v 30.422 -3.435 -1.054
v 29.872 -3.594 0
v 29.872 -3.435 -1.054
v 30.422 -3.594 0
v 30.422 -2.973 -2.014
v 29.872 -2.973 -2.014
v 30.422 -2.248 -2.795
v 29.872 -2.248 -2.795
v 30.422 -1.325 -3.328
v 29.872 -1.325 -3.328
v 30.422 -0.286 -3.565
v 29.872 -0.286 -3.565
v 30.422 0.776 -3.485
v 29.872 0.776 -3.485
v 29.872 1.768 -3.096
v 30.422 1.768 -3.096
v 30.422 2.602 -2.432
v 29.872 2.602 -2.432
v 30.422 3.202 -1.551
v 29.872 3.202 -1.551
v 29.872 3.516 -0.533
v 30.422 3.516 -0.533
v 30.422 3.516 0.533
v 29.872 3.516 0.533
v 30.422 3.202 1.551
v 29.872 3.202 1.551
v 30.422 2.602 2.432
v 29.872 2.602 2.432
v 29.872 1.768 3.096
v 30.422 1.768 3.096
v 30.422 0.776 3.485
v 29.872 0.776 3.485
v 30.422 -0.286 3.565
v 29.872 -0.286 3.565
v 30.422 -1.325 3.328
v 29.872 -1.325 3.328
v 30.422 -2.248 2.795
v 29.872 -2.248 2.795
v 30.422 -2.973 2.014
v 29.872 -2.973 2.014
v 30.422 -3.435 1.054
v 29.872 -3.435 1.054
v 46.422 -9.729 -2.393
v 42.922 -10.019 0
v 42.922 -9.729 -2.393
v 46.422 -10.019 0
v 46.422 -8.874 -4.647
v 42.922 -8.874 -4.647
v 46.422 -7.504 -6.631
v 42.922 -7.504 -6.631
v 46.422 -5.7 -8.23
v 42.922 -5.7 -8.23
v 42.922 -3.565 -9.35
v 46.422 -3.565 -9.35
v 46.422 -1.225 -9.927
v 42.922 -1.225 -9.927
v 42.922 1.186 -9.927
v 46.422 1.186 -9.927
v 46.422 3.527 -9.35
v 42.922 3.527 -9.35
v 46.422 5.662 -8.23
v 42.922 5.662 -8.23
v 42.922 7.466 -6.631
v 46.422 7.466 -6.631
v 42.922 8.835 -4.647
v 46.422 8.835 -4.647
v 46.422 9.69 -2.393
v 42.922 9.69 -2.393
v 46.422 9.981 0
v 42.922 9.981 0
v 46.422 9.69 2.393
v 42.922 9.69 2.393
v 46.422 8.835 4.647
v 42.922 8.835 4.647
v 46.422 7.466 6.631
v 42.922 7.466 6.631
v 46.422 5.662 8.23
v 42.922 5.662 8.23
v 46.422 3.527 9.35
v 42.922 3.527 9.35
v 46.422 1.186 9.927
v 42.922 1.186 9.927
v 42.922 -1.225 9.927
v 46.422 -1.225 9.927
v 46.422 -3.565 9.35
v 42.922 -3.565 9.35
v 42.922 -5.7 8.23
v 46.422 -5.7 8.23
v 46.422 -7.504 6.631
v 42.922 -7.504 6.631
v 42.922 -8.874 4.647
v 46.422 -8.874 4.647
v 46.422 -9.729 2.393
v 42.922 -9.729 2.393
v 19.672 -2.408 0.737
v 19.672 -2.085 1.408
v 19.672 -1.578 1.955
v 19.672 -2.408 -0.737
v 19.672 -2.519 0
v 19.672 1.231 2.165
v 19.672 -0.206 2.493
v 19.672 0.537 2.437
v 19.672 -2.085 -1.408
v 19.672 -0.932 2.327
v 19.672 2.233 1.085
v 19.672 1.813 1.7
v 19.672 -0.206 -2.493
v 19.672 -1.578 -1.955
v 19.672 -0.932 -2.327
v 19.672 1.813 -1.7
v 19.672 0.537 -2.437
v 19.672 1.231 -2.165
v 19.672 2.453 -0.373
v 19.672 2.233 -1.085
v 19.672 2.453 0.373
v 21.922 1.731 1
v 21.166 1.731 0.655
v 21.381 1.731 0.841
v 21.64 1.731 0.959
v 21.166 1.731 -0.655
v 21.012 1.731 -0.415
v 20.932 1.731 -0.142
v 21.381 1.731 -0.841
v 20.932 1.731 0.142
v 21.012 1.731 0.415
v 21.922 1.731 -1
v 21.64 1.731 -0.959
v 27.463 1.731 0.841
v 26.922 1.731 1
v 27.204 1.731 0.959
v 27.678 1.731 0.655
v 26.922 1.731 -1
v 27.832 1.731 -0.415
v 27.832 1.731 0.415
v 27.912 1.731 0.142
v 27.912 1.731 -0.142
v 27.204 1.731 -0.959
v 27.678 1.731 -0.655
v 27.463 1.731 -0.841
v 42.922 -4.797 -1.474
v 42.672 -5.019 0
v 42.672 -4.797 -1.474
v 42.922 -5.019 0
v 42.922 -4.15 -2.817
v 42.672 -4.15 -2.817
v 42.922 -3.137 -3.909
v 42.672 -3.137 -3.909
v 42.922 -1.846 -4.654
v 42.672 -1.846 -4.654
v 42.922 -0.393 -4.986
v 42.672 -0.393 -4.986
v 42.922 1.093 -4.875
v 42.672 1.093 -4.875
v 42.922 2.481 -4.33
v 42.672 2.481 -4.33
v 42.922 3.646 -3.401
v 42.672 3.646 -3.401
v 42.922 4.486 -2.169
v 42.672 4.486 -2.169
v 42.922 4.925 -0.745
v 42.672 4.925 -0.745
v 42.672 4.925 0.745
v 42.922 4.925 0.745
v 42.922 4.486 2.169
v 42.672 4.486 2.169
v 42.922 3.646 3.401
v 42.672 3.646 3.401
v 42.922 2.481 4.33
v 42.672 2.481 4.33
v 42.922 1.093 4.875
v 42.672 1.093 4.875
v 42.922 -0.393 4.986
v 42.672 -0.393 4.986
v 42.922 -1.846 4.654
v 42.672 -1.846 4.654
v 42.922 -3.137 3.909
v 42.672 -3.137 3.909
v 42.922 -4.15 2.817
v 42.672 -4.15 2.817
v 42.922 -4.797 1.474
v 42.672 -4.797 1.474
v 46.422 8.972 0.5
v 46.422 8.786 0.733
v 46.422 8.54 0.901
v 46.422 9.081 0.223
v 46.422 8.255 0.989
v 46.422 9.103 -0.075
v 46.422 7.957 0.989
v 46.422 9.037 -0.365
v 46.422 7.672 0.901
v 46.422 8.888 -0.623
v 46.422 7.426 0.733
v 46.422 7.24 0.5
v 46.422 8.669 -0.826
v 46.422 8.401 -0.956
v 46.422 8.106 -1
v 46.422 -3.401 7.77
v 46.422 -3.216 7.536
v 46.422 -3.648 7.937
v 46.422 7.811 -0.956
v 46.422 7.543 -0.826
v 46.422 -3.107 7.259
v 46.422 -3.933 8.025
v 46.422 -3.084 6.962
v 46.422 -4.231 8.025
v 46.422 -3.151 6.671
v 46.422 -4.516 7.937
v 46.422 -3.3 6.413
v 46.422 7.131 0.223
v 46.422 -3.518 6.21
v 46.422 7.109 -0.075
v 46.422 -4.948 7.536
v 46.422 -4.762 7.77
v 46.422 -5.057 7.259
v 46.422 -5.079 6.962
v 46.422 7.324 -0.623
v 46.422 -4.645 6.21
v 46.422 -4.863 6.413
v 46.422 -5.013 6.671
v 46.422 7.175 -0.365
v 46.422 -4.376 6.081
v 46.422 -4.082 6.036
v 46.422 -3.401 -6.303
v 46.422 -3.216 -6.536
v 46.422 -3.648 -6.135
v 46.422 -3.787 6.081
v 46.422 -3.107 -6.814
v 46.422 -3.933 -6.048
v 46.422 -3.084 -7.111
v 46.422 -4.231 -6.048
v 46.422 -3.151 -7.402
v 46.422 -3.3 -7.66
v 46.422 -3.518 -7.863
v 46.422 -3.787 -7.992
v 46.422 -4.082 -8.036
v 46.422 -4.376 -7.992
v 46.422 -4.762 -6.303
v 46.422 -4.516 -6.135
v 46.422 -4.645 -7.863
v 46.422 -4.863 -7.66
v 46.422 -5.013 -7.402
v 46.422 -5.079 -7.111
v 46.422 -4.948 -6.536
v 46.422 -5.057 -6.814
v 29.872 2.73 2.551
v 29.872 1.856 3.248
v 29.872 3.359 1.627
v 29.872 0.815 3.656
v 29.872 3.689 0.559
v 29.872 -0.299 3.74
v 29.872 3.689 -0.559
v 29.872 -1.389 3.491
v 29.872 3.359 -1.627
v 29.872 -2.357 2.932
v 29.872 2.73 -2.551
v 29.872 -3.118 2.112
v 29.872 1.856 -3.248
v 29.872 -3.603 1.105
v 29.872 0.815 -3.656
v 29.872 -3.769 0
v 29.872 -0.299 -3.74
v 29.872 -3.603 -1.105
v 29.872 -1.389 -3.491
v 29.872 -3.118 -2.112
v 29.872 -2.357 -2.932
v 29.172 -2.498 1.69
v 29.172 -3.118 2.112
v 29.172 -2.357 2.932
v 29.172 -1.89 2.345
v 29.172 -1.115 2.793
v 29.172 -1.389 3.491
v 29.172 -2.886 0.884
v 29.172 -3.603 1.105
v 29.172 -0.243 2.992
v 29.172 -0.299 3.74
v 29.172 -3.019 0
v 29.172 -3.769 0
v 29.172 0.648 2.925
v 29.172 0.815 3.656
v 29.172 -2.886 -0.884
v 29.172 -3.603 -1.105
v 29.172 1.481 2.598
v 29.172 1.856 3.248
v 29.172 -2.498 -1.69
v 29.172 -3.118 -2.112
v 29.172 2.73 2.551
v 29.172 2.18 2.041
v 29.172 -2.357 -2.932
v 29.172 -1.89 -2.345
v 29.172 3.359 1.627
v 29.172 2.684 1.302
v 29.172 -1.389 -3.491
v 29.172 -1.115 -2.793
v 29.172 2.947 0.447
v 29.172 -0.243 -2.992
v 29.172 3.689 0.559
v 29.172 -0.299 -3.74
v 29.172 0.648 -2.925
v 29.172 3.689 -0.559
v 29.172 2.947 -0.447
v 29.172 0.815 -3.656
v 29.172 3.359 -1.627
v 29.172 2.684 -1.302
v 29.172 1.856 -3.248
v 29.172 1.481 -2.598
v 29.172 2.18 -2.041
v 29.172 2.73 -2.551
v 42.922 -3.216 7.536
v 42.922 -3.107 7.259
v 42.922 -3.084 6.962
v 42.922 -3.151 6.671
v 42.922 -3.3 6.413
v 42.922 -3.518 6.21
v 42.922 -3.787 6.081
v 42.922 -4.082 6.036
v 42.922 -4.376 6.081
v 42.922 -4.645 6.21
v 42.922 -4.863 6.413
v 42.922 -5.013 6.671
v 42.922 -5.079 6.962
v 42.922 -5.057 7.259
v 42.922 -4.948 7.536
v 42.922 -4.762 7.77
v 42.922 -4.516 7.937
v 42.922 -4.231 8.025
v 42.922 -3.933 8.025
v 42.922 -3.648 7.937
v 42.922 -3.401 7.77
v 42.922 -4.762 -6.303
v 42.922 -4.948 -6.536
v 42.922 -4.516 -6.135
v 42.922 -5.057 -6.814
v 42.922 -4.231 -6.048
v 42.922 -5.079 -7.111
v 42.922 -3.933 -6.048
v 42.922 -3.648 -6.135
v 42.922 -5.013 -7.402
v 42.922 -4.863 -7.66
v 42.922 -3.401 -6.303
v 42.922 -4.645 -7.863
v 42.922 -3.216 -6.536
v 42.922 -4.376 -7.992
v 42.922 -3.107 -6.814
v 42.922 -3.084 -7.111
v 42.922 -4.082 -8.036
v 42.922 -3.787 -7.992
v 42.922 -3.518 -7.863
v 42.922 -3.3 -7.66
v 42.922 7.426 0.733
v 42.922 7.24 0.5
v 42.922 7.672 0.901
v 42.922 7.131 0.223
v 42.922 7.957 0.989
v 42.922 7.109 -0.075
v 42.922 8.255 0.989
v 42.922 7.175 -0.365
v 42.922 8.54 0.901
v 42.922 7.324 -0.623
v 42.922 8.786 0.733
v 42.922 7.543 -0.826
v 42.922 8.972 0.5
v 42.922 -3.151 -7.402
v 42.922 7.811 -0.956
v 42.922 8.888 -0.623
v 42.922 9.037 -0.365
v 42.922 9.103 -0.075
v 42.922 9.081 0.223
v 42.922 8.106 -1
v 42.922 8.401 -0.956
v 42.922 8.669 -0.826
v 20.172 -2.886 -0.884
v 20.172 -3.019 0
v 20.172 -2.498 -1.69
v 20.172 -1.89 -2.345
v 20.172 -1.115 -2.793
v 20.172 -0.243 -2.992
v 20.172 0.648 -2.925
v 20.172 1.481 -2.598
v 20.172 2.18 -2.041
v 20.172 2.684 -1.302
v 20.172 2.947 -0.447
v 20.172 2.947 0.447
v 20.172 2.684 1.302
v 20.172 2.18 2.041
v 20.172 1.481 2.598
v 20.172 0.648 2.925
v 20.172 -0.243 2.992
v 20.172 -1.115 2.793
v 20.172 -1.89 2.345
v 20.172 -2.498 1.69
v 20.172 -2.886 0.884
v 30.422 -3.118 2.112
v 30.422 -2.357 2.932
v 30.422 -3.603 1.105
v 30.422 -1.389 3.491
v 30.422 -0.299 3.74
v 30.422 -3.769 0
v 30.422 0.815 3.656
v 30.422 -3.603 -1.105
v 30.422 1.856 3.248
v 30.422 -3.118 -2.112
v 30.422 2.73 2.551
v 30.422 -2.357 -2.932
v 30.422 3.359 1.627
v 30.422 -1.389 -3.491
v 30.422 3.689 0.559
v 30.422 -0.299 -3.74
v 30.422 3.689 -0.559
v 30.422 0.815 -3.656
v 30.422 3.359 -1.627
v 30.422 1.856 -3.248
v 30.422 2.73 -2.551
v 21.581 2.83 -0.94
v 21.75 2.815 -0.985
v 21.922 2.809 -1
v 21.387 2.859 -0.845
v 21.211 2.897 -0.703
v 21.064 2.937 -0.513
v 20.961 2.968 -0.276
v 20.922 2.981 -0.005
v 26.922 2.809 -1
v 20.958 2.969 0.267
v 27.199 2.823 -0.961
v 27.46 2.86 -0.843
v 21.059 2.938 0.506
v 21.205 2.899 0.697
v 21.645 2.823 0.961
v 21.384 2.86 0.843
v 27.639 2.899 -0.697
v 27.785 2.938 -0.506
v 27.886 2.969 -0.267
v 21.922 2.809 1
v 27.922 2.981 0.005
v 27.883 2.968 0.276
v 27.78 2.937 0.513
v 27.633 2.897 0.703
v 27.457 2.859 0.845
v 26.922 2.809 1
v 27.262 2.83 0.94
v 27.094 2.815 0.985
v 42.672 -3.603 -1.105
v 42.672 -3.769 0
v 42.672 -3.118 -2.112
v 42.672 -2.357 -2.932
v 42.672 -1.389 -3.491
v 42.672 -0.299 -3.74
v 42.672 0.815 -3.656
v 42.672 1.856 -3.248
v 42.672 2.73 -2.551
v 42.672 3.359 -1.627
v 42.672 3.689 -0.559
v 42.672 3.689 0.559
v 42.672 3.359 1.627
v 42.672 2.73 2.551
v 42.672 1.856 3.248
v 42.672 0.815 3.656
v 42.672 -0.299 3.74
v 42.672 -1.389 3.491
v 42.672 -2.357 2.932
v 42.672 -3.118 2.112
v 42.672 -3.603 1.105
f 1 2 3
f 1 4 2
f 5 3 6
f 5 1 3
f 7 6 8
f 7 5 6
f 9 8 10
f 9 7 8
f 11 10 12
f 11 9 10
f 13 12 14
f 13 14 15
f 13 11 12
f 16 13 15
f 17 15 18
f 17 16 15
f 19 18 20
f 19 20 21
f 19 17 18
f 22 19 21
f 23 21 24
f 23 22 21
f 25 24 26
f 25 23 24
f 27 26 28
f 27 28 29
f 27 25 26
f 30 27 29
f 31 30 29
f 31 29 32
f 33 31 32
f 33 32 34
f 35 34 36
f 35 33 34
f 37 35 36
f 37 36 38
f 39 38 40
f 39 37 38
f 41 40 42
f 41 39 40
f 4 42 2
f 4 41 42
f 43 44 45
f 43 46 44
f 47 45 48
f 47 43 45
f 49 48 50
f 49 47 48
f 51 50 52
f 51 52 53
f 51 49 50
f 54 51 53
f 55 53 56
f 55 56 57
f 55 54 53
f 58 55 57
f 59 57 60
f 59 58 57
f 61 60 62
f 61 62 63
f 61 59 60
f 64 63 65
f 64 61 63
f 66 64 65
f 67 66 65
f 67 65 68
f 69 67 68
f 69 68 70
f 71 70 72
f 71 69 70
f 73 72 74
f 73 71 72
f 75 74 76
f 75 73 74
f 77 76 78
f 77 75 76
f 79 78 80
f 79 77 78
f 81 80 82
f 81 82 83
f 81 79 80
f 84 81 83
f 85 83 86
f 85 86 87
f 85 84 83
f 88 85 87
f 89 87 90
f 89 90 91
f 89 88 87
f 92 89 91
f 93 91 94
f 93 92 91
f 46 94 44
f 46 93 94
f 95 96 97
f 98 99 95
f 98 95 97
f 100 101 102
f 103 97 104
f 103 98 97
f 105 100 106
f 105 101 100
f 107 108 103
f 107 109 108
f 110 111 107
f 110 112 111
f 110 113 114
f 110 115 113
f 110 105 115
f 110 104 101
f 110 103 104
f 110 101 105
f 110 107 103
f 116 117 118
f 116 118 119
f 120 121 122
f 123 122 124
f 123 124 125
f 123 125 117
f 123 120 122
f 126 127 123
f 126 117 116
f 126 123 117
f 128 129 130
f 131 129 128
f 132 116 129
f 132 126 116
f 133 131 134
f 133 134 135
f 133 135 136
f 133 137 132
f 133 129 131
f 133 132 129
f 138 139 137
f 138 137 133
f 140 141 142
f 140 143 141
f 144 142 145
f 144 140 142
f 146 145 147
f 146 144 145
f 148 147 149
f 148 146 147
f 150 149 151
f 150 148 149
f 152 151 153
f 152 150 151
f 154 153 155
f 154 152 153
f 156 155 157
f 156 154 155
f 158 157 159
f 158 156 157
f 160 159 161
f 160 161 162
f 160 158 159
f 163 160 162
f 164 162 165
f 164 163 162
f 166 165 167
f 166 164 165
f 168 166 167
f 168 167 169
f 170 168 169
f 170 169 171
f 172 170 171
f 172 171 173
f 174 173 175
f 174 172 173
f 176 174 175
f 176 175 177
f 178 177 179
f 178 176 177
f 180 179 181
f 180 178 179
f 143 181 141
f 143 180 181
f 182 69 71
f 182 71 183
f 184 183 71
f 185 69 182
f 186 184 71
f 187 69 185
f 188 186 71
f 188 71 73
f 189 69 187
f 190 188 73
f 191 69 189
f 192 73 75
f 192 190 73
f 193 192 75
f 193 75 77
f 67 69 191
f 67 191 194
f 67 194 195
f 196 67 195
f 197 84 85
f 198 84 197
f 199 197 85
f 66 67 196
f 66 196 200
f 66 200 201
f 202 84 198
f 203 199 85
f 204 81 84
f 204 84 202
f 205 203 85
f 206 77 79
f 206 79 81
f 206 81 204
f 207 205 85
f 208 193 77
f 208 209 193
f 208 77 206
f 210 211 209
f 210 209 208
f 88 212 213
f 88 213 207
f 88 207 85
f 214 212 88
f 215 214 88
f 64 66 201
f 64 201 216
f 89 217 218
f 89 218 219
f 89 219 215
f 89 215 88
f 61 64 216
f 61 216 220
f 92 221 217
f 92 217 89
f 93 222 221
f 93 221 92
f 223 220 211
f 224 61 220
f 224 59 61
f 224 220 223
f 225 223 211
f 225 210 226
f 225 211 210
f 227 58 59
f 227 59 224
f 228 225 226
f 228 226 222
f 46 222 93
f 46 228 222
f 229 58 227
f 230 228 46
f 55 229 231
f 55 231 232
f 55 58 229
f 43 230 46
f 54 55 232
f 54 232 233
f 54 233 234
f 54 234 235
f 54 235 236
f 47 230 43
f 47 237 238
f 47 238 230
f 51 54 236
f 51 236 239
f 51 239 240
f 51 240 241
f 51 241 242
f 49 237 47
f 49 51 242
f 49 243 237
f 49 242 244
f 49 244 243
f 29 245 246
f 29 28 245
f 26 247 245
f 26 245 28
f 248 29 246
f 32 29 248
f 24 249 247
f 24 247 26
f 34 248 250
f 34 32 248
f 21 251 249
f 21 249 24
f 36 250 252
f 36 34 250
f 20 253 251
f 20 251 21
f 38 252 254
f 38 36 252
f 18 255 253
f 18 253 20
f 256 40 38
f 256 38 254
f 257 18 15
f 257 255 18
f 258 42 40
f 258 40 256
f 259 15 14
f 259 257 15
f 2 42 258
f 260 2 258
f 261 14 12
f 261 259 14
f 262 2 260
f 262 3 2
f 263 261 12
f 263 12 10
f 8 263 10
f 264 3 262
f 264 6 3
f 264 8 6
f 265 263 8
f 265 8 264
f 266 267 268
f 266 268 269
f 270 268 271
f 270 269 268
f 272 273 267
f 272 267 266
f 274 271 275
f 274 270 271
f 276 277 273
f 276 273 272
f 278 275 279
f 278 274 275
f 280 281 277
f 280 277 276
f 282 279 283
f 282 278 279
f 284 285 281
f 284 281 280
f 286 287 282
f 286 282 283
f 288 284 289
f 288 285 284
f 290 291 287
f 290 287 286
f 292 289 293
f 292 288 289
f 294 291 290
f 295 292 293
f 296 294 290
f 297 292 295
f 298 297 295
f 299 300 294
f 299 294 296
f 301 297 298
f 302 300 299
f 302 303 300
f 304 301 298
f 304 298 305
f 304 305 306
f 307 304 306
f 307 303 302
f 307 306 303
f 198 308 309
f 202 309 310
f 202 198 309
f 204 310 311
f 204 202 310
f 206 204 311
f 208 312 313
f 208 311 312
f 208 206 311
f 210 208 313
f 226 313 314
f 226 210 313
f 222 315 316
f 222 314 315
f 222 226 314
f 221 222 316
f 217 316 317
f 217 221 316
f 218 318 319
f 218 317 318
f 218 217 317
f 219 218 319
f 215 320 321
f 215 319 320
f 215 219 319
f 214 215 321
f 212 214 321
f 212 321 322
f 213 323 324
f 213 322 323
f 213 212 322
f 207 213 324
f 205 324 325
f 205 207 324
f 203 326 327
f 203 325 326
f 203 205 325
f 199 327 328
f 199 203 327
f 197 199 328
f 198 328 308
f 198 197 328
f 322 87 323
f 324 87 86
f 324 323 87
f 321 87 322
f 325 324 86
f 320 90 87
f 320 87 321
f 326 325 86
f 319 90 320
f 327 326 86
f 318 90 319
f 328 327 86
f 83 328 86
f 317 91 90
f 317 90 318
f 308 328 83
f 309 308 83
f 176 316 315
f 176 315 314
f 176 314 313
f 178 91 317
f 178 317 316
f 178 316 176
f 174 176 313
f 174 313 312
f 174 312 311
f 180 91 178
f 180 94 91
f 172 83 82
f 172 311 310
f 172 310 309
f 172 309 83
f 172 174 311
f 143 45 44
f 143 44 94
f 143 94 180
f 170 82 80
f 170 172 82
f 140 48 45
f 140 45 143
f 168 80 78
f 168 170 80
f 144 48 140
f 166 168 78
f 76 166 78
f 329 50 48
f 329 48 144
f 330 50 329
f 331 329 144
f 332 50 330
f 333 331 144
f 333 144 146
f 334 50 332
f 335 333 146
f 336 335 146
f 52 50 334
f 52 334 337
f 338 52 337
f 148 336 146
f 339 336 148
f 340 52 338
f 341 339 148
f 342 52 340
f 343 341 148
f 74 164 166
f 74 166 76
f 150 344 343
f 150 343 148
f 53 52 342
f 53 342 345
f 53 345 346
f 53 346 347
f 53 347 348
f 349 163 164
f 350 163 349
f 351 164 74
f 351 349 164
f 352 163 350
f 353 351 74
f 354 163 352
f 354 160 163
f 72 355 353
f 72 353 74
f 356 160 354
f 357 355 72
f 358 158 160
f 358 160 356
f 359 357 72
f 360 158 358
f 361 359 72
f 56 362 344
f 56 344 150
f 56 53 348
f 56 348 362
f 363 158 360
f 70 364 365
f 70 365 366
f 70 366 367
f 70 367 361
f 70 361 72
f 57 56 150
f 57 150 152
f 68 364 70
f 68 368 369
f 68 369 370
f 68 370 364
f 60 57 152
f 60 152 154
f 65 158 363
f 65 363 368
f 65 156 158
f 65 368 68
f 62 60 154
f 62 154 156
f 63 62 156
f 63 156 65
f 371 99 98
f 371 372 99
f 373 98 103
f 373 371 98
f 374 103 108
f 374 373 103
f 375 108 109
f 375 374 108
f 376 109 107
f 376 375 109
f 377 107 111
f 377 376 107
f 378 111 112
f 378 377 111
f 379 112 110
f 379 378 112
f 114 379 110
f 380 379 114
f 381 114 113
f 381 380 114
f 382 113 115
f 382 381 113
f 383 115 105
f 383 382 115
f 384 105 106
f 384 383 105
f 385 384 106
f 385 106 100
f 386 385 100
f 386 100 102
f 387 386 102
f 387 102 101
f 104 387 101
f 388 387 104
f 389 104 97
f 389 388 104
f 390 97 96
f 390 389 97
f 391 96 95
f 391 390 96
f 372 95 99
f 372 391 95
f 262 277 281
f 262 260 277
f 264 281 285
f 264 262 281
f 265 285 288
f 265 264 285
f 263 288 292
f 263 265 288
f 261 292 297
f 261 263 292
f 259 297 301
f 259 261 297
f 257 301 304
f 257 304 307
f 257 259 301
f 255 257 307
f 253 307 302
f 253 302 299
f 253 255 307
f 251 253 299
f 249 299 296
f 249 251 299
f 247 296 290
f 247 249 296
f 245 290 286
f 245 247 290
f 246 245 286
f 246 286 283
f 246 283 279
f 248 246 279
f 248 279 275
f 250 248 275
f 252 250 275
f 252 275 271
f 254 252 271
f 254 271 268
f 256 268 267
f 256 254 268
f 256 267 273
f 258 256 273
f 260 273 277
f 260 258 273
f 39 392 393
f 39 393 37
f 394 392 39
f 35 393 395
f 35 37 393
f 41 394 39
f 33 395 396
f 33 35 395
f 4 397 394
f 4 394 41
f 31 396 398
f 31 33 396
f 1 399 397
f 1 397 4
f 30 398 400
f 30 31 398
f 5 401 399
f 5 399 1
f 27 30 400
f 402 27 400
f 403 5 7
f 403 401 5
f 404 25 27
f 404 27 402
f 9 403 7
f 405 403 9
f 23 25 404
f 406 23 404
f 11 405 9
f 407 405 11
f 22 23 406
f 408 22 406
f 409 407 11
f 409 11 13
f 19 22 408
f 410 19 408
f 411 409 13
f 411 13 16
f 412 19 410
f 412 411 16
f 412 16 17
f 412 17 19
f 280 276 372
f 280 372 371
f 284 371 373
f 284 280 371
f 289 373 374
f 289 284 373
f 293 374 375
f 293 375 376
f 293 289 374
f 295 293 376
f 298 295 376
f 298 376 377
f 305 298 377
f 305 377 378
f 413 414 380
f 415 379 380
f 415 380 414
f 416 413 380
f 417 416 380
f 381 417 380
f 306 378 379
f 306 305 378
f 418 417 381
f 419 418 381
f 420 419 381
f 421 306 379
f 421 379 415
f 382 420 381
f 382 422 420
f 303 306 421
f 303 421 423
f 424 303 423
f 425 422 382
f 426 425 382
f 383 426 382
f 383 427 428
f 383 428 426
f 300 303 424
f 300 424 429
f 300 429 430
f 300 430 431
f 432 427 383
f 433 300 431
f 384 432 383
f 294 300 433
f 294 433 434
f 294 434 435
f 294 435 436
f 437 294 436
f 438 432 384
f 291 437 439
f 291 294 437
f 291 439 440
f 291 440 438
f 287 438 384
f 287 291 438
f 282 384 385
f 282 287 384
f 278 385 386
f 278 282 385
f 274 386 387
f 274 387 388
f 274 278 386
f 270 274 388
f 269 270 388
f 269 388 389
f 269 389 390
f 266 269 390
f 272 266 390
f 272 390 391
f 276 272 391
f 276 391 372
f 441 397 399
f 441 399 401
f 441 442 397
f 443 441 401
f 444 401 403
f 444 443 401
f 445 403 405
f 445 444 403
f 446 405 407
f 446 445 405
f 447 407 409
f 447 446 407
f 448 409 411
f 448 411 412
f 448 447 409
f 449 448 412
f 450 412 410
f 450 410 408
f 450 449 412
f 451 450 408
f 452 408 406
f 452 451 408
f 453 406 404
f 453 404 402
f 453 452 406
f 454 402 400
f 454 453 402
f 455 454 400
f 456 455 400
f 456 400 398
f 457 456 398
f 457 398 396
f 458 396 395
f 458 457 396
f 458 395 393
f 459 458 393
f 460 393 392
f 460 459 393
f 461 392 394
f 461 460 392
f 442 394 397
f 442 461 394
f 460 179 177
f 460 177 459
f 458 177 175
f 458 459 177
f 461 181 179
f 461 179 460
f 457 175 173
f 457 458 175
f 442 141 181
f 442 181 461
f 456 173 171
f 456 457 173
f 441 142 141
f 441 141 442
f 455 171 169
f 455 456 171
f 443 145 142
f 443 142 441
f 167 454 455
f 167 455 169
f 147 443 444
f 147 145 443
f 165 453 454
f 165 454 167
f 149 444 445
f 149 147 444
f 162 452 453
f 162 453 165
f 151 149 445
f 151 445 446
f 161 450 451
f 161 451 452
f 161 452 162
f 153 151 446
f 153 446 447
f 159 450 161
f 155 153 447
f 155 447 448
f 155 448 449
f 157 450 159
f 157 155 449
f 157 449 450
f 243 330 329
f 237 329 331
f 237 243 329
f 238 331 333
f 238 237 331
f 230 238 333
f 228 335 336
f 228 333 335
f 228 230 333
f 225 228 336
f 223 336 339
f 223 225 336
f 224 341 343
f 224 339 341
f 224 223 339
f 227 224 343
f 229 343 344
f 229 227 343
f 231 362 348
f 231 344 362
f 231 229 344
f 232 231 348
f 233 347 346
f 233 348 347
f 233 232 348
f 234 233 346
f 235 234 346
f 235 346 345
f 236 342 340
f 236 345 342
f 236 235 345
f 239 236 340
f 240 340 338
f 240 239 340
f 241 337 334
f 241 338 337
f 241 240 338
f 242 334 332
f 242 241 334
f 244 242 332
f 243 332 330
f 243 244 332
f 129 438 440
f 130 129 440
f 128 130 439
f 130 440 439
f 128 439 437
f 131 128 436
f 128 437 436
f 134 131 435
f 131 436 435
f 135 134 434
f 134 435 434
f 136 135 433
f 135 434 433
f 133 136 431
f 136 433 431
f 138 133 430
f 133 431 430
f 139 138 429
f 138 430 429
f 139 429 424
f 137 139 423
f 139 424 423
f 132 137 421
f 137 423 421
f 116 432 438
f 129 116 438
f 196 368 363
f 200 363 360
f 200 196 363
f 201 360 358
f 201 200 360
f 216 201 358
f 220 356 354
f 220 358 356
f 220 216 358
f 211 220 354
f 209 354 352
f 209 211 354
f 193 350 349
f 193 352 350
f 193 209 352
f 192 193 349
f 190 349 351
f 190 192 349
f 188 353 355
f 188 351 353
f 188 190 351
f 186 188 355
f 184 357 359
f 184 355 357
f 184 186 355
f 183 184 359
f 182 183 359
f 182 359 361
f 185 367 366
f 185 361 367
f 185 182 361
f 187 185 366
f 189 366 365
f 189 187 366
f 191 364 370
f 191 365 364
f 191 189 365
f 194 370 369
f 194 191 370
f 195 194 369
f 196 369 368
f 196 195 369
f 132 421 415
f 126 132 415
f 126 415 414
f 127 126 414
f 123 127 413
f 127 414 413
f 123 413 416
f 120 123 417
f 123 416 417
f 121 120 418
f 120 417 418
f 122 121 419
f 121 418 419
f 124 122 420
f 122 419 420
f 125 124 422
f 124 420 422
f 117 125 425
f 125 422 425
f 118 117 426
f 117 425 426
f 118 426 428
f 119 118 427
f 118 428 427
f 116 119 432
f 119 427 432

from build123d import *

# Parameters (mm, degrees)
CIRPATTERN1_COUNT  = 3
CUT_EXTRUDE1_START = 6
CUT_EXTRUDE1_DEPTH = 2.5
ECHELLE1_SCALE     = 2
ECHELLE2_SCALE     = 0.25


with BuildPart() as part:
    # Sketch1 → Revolve3 (revolve)
    with BuildSketch(Plane.XY):
        Polygon((0, 0), (0, 5), (1, 6), (19, 6), (19, 7.5), (20.4, 7.5), (20.4, 7.15), (21.5, 7.15), (21.5, 7.5), (46, 7.5), (46, 10), (46.5, 10), (46.5, 20), (53.5, 20), (53.5, 0), align=None)
    revolve(axis=Axis((0, 0, 0), (1, 0, 0)))

    # Sketch3 → Ø4.0 (4) Diameter Hole1 (revolve, cut)
    with BuildSketch(Plane(origin=(53.5, 16.25, 0), x_dir=(0, 0, -1), z_dir=(0, 1, 0))):
        Polygon((0, 0), (0, 13.201721238), (2, 12), (2, 0), align=None)
    f_4_0_4_diameter_hole1 = revolve(axis=Axis((59.85, 16.25, 0), (-1, 0, 0)), mode=Mode.SUBTRACT)

    # CirPattern1: Ø4.0 (4) Diameter Hole1 ×3 about axis
    cirpattern1_axis = Axis((53.5, 0, 0), (-1, 0, 0))
    for i in range(1, CIRPATTERN1_COUNT):
        add(f_4_0_4_diameter_hole1.rotate(cirpattern1_axis, i * 360 / CIRPATTERN1_COUNT), mode=Mode.SUBTRACT)

    # Sketch6 → Cut-Extrude1 (cut)
    with BuildSketch(Plane(origin=(0, 0, 0), x_dir=(1, 0, 0), z_dir=(0, 1, 0)).offset(CUT_EXTRUDE1_START)):
        with BuildLine():
            Line((4.5, -2), (14.5, -2))
            ThreePointArc((14.5, -2), (16.5, 0), (14.5, 2))
            Line((14.5, 2), (4.5, 2))
            ThreePointArc((4.5, 2), (2.5, 0), (4.5, -2))
        make_face()
    extrude(amount=-CUT_EXTRUDE1_DEPTH, mode=Mode.SUBTRACT)


with BuildPart() as part_1:
    # Echelle1: scaled about (39.34389117, -0.038274574, 5e-09)
    add(part.part.scale(ECHELLE1_SCALE).moved(Location((-39.34389117, 0.038274574, -5e-09))))


with BuildPart() as part_2:
    # Echelle2: scaled about (39.343891171, -0.038274573, 4e-09)
    add(part_1.part.scale(ECHELLE2_SCALE).moved(Location((29.507918378, -0.02870593, 3e-09))))


solid = part_2.part
